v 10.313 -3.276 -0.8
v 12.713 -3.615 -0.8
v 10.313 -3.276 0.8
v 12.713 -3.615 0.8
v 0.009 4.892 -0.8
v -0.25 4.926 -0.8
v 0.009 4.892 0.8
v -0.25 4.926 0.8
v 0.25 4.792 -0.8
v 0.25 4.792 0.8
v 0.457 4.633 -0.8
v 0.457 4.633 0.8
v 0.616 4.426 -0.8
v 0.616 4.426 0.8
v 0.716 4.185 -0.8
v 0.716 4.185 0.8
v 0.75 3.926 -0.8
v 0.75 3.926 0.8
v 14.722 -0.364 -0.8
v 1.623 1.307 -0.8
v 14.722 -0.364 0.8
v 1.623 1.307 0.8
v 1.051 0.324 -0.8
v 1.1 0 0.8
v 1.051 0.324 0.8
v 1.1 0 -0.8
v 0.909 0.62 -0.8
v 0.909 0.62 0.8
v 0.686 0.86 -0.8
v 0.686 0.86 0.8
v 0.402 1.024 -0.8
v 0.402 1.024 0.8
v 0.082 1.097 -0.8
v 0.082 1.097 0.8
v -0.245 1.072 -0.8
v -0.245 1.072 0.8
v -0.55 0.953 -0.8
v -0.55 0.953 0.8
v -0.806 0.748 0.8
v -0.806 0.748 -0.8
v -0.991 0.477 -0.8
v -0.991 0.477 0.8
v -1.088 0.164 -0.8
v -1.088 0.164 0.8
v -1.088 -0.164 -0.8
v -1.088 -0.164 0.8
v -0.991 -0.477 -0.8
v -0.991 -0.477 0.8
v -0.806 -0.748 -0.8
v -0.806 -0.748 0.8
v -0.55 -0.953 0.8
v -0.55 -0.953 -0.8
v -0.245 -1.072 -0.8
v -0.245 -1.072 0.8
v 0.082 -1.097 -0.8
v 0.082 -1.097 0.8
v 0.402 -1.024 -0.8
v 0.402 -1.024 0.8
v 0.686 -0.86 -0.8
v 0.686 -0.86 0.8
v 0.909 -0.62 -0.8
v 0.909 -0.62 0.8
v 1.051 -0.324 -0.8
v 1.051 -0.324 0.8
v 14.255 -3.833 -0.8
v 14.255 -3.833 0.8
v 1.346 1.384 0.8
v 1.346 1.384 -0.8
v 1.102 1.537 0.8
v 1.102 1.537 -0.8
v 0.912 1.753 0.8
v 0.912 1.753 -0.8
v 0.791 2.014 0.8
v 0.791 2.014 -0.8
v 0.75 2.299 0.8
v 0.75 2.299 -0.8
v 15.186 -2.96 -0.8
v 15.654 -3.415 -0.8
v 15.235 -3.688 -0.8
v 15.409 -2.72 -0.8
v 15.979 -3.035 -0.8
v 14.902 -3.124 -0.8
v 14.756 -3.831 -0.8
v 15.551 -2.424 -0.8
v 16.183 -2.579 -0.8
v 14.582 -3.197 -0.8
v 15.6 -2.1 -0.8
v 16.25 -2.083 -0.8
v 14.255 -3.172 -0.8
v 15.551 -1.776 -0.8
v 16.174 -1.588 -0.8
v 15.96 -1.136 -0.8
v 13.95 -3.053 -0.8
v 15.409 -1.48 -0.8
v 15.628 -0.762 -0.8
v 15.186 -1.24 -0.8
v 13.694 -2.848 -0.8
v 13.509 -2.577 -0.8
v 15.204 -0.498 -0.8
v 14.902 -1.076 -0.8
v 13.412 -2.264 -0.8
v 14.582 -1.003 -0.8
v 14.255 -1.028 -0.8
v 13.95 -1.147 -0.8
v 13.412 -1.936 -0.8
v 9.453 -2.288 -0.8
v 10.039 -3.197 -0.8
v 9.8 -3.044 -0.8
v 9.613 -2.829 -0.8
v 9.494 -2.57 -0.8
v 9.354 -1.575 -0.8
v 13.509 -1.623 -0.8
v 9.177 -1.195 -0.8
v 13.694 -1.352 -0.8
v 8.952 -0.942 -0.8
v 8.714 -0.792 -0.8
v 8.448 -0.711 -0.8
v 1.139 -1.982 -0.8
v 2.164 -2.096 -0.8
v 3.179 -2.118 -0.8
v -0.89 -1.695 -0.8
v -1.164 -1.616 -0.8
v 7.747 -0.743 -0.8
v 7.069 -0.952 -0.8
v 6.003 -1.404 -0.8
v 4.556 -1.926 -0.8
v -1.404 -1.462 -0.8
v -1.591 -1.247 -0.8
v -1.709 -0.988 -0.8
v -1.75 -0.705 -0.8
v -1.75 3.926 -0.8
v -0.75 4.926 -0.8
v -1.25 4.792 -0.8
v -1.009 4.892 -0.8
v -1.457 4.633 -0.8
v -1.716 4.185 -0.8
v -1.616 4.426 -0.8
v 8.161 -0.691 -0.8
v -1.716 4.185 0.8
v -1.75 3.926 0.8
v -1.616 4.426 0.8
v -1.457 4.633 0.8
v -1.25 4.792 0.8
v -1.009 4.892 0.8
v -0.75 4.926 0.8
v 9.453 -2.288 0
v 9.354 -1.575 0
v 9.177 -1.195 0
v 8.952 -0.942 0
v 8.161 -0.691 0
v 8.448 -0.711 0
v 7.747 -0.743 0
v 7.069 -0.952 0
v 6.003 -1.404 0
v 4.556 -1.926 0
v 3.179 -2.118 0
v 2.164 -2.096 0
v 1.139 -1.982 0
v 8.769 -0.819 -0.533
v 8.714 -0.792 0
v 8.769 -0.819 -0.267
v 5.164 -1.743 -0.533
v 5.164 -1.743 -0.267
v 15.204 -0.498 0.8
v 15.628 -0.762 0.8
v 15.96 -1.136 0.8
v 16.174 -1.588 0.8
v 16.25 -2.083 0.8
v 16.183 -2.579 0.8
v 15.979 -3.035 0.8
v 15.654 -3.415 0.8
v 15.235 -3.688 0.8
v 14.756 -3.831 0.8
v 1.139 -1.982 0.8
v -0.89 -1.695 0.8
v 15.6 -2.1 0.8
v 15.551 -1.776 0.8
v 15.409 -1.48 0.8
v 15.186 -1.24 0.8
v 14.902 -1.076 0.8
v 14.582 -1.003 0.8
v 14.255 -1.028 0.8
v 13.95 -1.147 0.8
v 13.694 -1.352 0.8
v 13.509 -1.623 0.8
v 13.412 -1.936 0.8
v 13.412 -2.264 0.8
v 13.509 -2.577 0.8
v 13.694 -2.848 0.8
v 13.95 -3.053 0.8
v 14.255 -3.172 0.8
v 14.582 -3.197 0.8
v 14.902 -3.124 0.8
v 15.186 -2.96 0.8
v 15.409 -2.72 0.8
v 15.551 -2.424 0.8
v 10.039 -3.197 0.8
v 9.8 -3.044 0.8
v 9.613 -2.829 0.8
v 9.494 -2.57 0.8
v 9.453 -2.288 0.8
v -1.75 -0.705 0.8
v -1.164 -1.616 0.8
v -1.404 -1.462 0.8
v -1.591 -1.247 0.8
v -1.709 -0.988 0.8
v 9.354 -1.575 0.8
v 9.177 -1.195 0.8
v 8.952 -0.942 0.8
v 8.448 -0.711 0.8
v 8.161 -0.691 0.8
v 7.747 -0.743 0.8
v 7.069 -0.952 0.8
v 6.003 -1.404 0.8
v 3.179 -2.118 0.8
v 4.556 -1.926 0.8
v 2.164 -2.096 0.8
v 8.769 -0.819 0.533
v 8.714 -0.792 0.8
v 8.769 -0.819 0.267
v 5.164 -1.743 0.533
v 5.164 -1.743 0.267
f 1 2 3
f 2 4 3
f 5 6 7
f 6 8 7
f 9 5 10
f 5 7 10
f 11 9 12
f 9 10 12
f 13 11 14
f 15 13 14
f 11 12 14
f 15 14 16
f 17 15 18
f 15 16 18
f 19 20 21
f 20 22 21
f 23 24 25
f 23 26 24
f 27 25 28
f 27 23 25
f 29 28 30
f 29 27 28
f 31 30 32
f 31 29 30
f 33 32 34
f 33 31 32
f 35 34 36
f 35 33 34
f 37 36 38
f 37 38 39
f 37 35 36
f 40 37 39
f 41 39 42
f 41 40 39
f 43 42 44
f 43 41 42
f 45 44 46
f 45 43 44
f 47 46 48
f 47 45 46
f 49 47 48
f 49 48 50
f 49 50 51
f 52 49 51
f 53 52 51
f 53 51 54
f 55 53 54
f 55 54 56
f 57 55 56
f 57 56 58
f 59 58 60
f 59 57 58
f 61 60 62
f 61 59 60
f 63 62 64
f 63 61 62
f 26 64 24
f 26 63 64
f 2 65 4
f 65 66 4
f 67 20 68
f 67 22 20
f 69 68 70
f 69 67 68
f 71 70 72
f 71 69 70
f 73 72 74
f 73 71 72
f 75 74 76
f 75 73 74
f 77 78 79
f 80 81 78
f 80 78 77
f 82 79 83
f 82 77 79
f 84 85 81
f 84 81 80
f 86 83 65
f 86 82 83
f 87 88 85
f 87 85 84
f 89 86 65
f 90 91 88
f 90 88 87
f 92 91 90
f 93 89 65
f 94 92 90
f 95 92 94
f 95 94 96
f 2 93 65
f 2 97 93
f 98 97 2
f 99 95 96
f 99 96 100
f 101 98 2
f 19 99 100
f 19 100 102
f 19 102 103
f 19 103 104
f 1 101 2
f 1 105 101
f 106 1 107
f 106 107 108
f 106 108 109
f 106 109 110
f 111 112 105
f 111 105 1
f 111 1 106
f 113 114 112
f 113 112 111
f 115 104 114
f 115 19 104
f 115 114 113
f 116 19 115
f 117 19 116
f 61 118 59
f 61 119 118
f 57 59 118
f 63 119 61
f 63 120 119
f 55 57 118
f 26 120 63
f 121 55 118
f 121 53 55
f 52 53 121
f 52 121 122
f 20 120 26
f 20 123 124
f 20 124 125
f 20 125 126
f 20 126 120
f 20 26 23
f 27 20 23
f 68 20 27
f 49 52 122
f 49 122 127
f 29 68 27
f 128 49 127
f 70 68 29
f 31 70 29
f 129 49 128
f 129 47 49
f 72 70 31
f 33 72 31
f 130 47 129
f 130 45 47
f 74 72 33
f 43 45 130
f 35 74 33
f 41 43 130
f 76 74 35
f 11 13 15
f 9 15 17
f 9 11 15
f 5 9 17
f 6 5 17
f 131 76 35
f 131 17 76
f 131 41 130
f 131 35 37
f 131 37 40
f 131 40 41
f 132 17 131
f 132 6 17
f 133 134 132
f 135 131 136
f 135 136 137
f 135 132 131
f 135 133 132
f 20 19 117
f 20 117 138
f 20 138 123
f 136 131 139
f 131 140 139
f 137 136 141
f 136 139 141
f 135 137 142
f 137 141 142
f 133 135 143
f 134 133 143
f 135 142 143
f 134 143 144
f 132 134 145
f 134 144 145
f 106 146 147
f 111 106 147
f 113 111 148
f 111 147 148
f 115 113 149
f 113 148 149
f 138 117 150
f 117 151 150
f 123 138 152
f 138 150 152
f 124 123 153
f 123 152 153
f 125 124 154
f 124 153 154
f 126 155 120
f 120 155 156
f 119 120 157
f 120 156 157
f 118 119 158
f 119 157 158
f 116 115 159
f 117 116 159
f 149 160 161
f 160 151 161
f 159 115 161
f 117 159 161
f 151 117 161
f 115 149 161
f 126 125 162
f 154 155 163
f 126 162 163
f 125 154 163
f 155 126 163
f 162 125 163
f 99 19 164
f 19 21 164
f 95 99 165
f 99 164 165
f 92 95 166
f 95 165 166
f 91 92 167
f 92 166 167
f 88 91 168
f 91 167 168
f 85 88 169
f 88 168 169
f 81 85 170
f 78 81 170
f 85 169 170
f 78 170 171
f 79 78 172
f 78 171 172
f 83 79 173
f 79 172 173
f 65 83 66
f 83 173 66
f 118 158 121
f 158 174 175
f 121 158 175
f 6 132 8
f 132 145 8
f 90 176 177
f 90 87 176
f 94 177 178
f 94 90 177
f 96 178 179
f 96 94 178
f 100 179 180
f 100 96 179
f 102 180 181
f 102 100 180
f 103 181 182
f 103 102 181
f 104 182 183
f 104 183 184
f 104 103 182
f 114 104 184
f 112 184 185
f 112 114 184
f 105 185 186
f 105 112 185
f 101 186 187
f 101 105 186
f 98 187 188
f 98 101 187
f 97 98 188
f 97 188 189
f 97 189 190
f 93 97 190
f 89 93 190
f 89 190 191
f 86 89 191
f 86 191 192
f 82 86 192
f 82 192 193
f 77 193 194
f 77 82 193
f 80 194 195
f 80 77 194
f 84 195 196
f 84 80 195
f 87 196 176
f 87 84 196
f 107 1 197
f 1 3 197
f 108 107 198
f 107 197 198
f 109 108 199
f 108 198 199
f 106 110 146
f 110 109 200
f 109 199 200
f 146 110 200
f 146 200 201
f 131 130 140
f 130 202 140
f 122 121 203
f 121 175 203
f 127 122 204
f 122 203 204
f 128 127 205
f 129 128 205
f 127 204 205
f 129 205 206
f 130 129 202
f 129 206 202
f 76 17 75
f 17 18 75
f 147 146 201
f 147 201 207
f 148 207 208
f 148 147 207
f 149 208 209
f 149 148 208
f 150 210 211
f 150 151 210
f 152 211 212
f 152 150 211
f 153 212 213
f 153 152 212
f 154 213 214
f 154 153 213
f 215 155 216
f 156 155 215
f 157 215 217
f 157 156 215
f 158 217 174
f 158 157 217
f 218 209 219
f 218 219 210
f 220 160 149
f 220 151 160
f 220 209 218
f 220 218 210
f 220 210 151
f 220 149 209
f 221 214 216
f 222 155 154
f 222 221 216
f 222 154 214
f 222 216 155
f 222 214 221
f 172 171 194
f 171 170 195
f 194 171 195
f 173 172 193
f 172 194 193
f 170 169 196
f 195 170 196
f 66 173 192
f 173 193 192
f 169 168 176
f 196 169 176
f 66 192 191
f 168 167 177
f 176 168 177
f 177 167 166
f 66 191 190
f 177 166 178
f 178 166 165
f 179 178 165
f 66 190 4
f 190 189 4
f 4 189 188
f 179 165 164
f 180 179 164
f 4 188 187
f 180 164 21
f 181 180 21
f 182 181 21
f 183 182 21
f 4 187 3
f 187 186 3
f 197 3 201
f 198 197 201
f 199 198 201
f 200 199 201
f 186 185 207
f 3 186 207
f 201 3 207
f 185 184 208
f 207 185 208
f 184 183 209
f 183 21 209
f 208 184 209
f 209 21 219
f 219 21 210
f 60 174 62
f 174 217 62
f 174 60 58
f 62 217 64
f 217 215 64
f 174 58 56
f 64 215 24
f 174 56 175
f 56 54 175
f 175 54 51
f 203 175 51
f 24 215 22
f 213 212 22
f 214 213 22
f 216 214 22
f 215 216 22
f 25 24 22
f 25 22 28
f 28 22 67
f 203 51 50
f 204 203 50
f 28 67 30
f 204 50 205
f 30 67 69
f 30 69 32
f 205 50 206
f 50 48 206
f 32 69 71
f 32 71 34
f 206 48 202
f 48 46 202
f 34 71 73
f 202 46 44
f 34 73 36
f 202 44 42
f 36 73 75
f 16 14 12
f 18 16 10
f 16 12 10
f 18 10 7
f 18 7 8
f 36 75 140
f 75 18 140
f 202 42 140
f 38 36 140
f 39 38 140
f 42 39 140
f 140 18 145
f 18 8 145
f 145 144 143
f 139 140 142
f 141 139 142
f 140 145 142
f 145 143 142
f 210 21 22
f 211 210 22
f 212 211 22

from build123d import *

# Parameters (mm, degrees)
SKETCH1_R           = 1.1
BOSS_EXTRUDE1_DEPTH = 0.8
FILLET1_R           = 1


with BuildPart() as part:
    # Sketch1 → Boss-Extrude1 (new, symmetric)
    with BuildSketch(Plane.XY):
        with BuildLine():
            Line((0.75, 1.418659837), (14.721500475, -0.364074443))
            ThreePointArc((14.721500475, -0.364074443), (16.234415683, -2.333028406), (14.255453949, -3.832829256))
            Line((14.255453949, -3.832829256), (12.712907233, -3.615136886))
            Line((12.712907233, -3.615136886), (10.312842352, -3.276427006))
            ThreePointArc((10.312842352, -3.276427006), (9.698394701, -2.942897128), (9.452585289, -2.288400506))
            add(Edge.make_bspline(
                [(9.452585289, -2.288400506), (9.450870019, -1.494900378), (8.489042718, 0.058923345), (4.930908227, -2.300819074), (2.487654104, -2.172094957), (1.138622907, -1.981712523)],
                knots=[0.051353436, 0.051353436, 0.051353436, 0.051353436, 0.215328782, 0.591995085, 1, 1, 1, 1], degree=3))
            Line((1.138622907, -1.981712523), (-1.75, -1.574054745))
            Line((-1.75, -1.574054745), (-1.75, 4.925945255))
            Line((-1.75, 4.925945255), (0.75, 4.925945255))
            Line((0.75, 4.925945255), (0.75, 1.418659837))
        make_face()
        with Locations((14.5, -2.1)):
            Circle(SKETCH1_R, mode=Mode.SUBTRACT)
        Circle(SKETCH1_R, mode=Mode.SUBTRACT)
    extrude(amount=BOSS_EXTRUDE1_DEPTH, both=True)

    # Fillet1
    fillet1_edges = [part.edges().sort_by_distance(p)[0] for p in [
        (0.75, 1.418659837, 0),
        (-1.75, -1.574054745, 0),
        (-1.75, 4.925945255, 0),
        (0.75, 4.925945255, 0),
    ]]
    fillet(fillet1_edges, radius=FILLET1_R)


solid = part.part
